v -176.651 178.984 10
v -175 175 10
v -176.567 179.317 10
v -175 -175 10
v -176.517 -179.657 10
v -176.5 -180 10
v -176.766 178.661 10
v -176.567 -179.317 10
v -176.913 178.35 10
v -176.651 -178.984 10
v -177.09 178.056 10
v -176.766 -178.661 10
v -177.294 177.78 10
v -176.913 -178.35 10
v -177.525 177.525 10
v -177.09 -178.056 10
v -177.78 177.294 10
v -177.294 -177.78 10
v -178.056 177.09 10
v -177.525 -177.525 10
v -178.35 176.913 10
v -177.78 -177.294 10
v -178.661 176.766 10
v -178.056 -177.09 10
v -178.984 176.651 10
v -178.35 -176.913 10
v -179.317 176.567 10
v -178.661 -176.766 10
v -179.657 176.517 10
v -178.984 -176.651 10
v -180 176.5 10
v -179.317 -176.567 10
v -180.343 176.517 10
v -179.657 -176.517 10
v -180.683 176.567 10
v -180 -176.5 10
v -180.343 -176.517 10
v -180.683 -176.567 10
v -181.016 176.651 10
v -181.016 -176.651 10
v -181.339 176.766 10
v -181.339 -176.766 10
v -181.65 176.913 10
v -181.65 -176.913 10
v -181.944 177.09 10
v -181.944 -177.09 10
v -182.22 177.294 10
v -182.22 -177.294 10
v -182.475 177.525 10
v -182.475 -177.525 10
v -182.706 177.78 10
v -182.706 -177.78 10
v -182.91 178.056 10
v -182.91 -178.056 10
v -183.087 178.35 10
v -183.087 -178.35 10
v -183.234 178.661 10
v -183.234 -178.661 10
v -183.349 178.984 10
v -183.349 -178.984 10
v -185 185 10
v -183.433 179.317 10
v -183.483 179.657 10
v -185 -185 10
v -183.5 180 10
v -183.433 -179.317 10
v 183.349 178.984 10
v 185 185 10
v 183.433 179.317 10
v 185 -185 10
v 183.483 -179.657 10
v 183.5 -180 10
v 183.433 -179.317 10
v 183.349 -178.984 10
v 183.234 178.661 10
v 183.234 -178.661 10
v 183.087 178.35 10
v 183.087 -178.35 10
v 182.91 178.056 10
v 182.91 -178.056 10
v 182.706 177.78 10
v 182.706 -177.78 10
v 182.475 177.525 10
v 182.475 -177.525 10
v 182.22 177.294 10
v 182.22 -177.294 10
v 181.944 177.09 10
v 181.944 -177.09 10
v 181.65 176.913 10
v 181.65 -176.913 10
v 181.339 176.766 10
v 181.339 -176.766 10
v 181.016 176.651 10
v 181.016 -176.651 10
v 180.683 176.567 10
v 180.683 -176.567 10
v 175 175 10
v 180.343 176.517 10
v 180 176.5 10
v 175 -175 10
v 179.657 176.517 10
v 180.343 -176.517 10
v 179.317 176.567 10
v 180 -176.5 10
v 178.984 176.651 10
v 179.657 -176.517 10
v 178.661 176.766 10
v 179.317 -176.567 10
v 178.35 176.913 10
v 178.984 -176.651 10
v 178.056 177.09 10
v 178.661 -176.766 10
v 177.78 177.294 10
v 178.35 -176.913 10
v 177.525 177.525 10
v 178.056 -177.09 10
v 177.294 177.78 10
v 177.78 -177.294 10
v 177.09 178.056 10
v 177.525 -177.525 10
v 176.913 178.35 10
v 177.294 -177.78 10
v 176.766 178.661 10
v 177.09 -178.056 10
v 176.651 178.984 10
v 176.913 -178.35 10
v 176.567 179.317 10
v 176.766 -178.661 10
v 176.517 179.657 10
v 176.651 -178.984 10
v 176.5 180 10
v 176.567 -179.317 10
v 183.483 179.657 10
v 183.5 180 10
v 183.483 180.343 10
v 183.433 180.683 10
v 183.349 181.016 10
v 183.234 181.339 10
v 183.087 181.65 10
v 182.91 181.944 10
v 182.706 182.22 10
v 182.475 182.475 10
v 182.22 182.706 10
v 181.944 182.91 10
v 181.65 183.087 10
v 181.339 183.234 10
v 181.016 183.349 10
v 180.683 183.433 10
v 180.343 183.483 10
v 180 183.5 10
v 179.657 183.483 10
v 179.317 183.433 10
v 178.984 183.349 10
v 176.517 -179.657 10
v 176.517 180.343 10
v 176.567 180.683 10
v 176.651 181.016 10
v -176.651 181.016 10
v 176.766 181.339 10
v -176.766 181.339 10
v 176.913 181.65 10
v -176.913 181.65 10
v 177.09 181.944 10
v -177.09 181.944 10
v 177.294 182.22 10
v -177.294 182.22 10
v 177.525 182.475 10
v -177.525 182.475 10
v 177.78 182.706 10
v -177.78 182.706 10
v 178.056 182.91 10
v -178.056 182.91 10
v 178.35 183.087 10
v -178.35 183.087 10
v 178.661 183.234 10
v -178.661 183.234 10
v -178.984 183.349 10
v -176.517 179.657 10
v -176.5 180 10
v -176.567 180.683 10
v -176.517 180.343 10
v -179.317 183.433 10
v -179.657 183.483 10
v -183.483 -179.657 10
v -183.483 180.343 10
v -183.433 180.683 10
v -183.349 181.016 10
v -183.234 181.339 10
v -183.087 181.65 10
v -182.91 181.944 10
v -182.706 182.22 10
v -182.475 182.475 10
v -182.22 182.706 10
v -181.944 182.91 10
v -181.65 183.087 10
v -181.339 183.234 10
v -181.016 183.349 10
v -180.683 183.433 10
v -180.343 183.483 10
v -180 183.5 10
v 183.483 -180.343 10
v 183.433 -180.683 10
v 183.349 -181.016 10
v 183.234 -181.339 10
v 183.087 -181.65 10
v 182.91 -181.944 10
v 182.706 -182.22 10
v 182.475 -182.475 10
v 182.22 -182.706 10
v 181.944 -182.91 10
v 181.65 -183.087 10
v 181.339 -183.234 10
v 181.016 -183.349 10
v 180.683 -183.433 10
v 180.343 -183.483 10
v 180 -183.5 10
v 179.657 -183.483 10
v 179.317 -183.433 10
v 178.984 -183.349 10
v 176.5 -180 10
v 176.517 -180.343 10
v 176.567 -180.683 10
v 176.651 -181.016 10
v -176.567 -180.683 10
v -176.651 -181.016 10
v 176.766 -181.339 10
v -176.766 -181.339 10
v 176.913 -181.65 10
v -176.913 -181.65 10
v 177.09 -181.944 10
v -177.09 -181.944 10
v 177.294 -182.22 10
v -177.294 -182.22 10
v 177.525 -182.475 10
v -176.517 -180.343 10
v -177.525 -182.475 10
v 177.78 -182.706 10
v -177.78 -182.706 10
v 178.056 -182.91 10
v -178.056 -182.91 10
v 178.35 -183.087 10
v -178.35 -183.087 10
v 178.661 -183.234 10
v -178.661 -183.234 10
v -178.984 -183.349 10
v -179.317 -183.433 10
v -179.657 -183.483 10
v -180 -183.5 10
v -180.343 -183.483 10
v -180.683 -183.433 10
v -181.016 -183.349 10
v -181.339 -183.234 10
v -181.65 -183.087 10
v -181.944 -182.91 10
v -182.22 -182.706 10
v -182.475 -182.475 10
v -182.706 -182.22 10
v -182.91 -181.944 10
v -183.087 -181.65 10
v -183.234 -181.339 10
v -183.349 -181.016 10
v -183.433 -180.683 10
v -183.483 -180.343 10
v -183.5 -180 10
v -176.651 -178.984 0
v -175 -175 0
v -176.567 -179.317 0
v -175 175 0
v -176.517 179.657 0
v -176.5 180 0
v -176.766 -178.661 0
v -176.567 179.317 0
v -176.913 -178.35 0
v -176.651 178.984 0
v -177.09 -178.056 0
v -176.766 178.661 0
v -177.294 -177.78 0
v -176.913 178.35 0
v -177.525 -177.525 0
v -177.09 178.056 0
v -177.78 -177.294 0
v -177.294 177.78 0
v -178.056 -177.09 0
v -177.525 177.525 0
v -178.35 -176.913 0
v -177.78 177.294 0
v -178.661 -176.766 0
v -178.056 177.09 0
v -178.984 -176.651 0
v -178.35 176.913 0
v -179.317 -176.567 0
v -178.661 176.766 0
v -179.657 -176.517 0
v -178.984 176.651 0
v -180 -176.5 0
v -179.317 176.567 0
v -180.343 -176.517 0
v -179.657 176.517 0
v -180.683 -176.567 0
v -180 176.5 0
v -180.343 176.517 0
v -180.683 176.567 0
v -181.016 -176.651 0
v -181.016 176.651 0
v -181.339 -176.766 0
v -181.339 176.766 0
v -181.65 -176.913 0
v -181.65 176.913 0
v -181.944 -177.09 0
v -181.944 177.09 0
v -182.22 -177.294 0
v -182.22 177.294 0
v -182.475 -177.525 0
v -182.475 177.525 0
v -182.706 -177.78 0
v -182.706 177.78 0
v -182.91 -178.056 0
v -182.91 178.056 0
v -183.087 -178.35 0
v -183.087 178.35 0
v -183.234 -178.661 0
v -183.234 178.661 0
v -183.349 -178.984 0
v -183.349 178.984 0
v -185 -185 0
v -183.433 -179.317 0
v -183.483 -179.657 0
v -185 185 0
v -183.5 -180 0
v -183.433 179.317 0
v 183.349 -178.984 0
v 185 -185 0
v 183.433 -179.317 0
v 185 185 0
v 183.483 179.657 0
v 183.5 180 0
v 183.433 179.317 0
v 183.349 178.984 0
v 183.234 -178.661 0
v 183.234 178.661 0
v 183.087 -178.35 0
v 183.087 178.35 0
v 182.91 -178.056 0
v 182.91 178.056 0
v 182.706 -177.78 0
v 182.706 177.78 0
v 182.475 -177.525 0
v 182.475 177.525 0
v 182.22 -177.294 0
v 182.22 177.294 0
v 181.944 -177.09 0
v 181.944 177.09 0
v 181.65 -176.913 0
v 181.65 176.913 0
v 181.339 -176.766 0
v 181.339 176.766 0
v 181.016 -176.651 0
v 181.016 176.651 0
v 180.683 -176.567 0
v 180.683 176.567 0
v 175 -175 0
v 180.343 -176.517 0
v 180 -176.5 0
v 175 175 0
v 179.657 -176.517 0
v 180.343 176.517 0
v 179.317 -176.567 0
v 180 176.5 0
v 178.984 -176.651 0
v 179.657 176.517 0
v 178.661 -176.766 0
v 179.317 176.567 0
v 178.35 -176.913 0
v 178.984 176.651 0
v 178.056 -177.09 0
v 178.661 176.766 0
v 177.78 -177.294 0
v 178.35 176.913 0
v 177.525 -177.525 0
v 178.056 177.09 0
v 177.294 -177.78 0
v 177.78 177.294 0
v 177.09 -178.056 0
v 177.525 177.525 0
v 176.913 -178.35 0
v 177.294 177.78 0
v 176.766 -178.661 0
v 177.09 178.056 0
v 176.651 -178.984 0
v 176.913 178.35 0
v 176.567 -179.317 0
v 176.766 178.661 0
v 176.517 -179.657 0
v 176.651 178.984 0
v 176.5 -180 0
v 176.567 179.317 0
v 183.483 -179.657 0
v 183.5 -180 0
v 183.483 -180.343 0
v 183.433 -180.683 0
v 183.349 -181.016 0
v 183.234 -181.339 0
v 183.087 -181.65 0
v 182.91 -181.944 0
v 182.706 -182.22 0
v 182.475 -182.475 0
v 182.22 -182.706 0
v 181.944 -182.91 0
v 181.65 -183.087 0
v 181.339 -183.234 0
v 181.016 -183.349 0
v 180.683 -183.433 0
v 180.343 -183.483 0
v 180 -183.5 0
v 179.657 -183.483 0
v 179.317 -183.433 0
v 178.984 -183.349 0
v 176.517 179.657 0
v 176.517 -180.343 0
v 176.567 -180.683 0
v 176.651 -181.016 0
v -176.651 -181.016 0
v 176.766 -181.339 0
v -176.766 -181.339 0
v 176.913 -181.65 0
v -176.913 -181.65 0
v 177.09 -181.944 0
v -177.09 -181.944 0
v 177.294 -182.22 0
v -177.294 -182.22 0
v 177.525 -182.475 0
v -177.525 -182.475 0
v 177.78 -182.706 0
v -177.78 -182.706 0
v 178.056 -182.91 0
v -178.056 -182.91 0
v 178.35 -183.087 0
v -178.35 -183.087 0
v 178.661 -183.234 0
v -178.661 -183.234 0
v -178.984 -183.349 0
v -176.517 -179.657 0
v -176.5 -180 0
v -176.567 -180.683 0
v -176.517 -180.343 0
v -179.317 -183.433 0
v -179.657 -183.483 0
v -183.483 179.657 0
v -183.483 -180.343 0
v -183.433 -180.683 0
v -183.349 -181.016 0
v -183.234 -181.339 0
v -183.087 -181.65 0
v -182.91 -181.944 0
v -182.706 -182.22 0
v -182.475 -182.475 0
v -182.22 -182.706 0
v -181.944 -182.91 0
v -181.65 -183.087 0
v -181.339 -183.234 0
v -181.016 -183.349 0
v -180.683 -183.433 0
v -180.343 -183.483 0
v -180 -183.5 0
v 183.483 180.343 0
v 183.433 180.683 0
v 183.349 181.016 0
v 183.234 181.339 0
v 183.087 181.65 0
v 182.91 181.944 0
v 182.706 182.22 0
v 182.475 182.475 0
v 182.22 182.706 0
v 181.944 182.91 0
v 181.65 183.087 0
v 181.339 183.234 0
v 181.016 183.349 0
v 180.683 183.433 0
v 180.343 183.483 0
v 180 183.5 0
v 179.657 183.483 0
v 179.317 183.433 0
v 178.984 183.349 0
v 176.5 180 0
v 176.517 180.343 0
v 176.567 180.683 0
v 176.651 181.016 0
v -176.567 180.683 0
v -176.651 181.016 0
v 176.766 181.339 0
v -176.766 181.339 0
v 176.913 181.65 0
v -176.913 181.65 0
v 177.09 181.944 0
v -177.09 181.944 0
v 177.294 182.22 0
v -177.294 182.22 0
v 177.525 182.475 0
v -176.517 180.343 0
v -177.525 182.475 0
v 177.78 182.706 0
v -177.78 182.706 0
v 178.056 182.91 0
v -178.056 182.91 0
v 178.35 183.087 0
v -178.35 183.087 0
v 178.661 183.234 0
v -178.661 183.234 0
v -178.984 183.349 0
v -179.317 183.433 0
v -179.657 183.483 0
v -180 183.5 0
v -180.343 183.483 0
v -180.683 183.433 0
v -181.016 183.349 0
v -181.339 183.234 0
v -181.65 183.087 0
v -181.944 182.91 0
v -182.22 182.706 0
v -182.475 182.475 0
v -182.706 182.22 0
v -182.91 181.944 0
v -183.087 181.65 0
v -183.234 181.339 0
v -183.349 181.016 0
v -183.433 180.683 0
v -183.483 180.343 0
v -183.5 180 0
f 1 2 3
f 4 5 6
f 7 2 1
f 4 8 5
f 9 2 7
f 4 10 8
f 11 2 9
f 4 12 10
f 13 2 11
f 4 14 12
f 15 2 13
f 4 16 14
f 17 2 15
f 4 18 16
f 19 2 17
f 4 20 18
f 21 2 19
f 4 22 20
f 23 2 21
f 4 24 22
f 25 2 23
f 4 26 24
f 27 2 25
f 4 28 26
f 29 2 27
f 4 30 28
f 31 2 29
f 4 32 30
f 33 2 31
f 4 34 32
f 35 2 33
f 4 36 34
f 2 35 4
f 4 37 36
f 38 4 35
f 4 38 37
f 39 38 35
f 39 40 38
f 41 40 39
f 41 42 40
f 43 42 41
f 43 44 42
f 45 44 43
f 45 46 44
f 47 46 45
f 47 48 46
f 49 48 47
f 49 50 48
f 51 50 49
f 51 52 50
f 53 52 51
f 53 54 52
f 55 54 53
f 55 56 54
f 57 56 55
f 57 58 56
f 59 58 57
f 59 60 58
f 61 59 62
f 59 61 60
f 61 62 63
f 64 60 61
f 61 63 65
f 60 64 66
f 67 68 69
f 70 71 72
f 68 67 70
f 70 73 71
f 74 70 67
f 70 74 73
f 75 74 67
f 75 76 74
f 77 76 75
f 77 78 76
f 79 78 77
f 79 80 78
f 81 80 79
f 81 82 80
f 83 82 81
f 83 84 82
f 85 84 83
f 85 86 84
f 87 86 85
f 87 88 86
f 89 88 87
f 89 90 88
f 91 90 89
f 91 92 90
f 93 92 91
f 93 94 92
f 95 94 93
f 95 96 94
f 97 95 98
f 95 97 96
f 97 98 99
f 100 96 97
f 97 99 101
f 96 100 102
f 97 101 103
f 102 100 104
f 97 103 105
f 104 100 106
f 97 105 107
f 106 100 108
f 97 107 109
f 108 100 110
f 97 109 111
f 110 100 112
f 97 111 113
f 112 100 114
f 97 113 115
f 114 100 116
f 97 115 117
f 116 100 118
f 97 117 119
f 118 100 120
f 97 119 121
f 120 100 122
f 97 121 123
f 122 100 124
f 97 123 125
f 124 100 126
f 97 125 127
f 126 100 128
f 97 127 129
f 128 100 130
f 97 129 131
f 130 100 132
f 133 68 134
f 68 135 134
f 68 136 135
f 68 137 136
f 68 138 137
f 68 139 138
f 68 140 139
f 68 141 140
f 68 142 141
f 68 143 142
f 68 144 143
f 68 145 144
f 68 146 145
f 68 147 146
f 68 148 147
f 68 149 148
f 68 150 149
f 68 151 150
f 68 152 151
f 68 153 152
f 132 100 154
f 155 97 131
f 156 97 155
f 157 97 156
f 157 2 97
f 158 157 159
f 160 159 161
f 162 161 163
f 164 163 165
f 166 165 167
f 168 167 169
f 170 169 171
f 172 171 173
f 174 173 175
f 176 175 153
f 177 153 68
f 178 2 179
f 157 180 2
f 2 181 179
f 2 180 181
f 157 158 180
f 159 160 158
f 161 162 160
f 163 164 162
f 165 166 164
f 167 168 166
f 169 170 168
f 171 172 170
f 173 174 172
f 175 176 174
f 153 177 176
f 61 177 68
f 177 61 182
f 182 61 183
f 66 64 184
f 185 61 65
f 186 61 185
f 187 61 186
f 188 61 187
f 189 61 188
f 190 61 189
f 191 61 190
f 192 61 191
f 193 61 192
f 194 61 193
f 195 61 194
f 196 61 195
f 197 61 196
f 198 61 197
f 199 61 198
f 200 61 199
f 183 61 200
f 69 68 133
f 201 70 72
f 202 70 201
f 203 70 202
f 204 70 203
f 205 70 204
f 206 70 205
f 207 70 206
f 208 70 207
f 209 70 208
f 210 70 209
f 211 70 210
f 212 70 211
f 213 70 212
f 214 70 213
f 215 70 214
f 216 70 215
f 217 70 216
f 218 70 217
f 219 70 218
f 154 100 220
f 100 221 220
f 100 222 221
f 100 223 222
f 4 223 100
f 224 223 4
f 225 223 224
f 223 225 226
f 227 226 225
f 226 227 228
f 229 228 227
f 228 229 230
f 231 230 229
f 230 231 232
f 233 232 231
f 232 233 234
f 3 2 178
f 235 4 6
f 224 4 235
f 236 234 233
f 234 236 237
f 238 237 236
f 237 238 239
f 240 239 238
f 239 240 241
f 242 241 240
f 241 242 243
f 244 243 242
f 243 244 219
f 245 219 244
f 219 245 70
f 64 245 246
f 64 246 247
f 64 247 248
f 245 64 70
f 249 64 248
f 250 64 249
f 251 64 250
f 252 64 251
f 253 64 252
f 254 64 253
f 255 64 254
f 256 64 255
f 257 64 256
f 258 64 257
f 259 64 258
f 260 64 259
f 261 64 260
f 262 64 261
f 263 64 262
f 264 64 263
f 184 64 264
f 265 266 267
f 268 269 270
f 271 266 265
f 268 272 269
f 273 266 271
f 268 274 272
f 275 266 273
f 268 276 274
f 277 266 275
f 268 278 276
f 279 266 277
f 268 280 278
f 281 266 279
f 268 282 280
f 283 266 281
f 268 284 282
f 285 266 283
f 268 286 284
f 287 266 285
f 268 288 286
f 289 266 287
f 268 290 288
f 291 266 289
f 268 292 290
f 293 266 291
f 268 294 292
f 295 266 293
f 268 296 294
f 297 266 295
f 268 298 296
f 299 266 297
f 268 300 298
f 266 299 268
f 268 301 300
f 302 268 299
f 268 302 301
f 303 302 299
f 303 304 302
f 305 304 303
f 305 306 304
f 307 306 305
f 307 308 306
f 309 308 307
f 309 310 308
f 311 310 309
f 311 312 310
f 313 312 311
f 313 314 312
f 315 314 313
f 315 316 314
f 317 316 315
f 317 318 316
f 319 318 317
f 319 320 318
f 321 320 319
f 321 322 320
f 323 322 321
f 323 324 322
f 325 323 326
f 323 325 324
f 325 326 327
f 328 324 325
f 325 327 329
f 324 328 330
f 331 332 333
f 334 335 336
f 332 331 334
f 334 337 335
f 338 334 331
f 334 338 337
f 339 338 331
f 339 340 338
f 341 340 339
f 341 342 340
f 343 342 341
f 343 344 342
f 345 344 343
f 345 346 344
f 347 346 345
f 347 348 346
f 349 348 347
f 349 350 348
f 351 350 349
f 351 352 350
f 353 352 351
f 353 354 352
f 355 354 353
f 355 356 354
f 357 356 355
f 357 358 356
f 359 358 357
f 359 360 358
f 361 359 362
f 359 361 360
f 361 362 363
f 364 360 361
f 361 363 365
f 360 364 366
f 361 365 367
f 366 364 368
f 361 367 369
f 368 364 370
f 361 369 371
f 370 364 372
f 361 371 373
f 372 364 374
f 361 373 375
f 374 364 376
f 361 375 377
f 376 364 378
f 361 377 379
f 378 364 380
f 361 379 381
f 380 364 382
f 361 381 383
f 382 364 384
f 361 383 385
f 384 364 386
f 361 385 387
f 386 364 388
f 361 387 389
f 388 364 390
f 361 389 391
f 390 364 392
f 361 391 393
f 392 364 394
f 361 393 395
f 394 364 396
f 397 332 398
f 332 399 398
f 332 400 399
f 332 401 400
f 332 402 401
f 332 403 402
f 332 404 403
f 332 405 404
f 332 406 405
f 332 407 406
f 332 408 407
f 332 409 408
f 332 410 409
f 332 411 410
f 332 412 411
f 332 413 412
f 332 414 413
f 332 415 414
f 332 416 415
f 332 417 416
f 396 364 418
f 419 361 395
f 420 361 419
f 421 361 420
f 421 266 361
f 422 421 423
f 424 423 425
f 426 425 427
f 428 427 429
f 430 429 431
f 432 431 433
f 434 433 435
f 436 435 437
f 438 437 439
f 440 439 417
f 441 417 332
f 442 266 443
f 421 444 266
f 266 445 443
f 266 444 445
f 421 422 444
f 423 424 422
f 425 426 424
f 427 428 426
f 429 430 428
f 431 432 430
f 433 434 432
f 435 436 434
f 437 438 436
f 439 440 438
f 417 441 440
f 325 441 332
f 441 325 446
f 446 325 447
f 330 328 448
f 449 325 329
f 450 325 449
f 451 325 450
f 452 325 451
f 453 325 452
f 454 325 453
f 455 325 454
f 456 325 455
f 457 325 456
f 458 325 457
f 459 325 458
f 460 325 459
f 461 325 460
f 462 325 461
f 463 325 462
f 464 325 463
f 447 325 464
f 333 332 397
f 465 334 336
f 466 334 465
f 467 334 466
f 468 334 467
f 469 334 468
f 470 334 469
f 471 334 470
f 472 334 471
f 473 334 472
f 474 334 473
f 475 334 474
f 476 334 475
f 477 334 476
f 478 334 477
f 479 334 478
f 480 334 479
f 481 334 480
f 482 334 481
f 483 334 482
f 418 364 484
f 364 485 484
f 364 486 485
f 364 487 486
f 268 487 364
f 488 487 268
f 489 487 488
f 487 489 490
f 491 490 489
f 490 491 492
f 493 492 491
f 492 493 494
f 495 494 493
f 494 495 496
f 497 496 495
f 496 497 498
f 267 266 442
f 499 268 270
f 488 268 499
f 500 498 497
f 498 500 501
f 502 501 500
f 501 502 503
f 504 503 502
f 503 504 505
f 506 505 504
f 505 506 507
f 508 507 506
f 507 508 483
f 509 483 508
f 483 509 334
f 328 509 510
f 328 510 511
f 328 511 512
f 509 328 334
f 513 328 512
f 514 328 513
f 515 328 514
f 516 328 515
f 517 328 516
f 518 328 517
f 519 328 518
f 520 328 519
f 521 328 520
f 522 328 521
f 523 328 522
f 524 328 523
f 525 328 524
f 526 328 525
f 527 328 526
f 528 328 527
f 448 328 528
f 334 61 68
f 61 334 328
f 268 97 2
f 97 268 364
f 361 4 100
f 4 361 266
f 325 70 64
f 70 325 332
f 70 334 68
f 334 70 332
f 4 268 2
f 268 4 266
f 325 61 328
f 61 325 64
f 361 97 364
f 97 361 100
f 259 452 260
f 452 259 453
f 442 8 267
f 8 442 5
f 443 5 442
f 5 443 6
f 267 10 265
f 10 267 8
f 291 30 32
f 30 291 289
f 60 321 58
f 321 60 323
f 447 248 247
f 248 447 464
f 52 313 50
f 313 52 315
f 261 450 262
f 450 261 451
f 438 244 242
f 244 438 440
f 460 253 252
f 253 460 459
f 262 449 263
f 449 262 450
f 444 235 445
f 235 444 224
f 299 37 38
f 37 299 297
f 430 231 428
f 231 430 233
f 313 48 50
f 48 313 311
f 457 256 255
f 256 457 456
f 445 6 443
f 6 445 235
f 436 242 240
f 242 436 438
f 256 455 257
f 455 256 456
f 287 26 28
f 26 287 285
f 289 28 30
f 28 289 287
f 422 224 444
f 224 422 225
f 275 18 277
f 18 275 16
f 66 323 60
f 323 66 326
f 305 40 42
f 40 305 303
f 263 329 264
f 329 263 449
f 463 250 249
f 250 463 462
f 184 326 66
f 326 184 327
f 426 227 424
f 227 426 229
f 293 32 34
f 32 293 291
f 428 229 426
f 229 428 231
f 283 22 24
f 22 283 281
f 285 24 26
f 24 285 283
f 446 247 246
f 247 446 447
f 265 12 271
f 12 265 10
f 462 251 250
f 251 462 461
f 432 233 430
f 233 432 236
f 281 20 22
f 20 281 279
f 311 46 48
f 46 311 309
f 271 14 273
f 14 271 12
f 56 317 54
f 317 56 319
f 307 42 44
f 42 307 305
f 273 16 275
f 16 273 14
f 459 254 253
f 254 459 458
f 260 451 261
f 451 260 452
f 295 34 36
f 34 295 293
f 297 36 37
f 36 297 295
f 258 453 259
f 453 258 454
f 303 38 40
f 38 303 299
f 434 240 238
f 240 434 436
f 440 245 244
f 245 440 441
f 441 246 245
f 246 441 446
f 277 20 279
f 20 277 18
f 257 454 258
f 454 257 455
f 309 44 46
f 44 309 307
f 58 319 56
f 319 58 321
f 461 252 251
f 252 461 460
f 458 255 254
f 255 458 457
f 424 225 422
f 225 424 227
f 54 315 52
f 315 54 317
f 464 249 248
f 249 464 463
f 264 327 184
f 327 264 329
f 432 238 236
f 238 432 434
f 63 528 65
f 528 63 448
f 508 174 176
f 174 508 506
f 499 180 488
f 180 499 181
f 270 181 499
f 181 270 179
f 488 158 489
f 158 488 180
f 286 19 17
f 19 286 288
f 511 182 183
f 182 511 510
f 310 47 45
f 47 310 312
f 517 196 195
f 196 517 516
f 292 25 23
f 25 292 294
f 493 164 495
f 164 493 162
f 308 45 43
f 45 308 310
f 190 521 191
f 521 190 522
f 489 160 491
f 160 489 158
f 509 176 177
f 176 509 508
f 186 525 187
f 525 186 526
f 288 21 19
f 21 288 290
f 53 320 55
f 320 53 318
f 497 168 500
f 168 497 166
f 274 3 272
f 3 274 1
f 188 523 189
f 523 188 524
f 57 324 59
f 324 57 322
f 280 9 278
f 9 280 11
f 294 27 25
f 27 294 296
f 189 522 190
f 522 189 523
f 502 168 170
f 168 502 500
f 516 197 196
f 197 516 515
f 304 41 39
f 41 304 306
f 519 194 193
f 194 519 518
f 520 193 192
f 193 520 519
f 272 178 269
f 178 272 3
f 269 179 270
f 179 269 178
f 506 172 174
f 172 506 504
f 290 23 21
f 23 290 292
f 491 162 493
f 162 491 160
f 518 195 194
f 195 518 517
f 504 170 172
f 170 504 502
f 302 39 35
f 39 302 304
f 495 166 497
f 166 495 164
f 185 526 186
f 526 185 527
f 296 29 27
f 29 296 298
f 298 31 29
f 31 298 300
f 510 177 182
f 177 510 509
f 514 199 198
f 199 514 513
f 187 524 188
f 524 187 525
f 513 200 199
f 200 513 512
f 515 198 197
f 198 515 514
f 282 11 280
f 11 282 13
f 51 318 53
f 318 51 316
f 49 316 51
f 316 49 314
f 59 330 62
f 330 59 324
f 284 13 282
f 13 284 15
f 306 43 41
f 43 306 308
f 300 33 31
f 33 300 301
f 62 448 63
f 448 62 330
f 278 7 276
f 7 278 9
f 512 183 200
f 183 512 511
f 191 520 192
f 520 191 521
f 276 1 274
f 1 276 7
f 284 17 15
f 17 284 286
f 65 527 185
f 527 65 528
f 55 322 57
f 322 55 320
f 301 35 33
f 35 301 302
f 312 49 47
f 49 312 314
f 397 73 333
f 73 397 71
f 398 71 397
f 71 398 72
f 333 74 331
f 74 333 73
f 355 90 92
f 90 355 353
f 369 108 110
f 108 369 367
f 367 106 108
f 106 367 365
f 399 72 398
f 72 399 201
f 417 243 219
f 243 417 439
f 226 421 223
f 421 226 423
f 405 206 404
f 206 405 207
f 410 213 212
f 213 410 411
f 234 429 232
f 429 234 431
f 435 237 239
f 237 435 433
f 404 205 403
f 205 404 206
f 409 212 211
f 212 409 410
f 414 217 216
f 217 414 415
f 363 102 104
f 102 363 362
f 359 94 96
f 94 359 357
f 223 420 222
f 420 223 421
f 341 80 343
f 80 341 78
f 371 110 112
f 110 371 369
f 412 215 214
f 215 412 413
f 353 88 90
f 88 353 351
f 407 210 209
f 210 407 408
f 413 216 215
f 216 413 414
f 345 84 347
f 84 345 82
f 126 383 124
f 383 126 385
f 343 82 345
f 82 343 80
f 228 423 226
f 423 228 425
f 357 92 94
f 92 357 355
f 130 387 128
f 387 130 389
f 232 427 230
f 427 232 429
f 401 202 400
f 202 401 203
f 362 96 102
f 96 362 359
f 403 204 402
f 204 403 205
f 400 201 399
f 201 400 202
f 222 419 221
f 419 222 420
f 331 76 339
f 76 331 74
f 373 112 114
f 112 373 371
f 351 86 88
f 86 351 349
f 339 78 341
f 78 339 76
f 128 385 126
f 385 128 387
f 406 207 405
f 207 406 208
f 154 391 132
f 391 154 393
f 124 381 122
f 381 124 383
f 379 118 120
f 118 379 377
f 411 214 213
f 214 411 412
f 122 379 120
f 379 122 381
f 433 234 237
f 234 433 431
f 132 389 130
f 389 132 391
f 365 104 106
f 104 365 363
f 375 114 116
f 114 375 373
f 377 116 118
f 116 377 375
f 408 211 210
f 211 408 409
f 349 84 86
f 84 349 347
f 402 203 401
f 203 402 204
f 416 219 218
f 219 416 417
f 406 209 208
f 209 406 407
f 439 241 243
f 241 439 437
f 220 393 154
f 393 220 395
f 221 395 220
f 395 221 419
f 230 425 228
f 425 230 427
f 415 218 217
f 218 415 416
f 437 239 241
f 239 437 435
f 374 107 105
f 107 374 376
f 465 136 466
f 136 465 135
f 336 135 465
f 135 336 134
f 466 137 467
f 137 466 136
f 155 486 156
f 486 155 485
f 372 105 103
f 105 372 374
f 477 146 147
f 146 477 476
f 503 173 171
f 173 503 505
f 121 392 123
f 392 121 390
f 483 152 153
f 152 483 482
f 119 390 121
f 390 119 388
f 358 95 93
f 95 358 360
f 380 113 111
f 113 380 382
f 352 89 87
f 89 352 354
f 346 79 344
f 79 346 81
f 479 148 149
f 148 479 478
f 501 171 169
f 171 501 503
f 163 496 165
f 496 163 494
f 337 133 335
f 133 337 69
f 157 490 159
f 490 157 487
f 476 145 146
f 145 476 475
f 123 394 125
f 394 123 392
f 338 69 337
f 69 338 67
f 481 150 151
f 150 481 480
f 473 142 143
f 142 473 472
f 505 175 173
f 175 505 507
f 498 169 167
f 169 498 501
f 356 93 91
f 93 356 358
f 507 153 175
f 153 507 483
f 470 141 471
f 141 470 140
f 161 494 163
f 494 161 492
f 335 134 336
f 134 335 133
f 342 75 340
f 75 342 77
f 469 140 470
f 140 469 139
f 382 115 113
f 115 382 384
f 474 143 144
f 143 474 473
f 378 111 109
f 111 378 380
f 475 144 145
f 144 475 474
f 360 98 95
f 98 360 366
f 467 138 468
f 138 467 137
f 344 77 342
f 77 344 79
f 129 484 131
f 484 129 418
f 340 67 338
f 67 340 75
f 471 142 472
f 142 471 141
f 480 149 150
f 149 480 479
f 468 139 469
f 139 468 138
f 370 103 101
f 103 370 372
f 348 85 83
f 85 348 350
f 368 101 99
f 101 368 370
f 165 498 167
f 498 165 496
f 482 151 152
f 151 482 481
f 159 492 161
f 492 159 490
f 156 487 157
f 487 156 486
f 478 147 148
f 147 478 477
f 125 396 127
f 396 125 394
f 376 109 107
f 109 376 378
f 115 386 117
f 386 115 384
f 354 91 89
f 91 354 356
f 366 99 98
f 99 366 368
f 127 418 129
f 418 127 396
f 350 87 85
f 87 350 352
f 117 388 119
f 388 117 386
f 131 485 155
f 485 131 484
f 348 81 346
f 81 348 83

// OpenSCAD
// ring_22.scad - ring index 22 (z bottom = 220 mm)
$fn = 64; bar = 10; half_b = bar/2; outer = 370; half_outer = outer/2;
front_y = 180; back_y = -180; left_x = -180; right_x = 180;
x_centers = [-170, -100, -30, 40, 110, 180];
z_centers = [5, 85, 155, 225, 295, 365, 435, 505, 575, 645, 715]; ring_z = 220;
module place_box(cx, cy, sx, sy) { translate([cx - sx/2, cy - sy/2, 0]) cube([sx, sy, bar]); }

difference() { union() {
    for (x = x_centers) { place_box(x, front_y, bar, bar); place_box(x, back_y, bar, bar); }
    for (y = x_centers) { place_box(left_x, y, bar, bar); place_box(right_x, y, bar, bar); }
    for (zc = z_centers) if ((zc - half_b < ring_z + bar) && (zc + half_b > ring_z)) {
        translate([-half_outer, front_y - half_b, 0]) cube([outer, bar, bar]);
        translate([-half_outer, back_y - half_b, 0])  cube([outer, bar, bar]);
        translate([left_x - half_b, -half_outer, 0])  cube([bar, outer, bar]);
        translate([right_x - half_b, -half_outer, 0]) cube([bar, outer, bar]);
    }
  }
  for (cx = [-180, 180]) for (cy = [-180, 180]) translate([cx, cy, 0]) cylinder(h = bar, r = 3.5, $fn = 64);
}
